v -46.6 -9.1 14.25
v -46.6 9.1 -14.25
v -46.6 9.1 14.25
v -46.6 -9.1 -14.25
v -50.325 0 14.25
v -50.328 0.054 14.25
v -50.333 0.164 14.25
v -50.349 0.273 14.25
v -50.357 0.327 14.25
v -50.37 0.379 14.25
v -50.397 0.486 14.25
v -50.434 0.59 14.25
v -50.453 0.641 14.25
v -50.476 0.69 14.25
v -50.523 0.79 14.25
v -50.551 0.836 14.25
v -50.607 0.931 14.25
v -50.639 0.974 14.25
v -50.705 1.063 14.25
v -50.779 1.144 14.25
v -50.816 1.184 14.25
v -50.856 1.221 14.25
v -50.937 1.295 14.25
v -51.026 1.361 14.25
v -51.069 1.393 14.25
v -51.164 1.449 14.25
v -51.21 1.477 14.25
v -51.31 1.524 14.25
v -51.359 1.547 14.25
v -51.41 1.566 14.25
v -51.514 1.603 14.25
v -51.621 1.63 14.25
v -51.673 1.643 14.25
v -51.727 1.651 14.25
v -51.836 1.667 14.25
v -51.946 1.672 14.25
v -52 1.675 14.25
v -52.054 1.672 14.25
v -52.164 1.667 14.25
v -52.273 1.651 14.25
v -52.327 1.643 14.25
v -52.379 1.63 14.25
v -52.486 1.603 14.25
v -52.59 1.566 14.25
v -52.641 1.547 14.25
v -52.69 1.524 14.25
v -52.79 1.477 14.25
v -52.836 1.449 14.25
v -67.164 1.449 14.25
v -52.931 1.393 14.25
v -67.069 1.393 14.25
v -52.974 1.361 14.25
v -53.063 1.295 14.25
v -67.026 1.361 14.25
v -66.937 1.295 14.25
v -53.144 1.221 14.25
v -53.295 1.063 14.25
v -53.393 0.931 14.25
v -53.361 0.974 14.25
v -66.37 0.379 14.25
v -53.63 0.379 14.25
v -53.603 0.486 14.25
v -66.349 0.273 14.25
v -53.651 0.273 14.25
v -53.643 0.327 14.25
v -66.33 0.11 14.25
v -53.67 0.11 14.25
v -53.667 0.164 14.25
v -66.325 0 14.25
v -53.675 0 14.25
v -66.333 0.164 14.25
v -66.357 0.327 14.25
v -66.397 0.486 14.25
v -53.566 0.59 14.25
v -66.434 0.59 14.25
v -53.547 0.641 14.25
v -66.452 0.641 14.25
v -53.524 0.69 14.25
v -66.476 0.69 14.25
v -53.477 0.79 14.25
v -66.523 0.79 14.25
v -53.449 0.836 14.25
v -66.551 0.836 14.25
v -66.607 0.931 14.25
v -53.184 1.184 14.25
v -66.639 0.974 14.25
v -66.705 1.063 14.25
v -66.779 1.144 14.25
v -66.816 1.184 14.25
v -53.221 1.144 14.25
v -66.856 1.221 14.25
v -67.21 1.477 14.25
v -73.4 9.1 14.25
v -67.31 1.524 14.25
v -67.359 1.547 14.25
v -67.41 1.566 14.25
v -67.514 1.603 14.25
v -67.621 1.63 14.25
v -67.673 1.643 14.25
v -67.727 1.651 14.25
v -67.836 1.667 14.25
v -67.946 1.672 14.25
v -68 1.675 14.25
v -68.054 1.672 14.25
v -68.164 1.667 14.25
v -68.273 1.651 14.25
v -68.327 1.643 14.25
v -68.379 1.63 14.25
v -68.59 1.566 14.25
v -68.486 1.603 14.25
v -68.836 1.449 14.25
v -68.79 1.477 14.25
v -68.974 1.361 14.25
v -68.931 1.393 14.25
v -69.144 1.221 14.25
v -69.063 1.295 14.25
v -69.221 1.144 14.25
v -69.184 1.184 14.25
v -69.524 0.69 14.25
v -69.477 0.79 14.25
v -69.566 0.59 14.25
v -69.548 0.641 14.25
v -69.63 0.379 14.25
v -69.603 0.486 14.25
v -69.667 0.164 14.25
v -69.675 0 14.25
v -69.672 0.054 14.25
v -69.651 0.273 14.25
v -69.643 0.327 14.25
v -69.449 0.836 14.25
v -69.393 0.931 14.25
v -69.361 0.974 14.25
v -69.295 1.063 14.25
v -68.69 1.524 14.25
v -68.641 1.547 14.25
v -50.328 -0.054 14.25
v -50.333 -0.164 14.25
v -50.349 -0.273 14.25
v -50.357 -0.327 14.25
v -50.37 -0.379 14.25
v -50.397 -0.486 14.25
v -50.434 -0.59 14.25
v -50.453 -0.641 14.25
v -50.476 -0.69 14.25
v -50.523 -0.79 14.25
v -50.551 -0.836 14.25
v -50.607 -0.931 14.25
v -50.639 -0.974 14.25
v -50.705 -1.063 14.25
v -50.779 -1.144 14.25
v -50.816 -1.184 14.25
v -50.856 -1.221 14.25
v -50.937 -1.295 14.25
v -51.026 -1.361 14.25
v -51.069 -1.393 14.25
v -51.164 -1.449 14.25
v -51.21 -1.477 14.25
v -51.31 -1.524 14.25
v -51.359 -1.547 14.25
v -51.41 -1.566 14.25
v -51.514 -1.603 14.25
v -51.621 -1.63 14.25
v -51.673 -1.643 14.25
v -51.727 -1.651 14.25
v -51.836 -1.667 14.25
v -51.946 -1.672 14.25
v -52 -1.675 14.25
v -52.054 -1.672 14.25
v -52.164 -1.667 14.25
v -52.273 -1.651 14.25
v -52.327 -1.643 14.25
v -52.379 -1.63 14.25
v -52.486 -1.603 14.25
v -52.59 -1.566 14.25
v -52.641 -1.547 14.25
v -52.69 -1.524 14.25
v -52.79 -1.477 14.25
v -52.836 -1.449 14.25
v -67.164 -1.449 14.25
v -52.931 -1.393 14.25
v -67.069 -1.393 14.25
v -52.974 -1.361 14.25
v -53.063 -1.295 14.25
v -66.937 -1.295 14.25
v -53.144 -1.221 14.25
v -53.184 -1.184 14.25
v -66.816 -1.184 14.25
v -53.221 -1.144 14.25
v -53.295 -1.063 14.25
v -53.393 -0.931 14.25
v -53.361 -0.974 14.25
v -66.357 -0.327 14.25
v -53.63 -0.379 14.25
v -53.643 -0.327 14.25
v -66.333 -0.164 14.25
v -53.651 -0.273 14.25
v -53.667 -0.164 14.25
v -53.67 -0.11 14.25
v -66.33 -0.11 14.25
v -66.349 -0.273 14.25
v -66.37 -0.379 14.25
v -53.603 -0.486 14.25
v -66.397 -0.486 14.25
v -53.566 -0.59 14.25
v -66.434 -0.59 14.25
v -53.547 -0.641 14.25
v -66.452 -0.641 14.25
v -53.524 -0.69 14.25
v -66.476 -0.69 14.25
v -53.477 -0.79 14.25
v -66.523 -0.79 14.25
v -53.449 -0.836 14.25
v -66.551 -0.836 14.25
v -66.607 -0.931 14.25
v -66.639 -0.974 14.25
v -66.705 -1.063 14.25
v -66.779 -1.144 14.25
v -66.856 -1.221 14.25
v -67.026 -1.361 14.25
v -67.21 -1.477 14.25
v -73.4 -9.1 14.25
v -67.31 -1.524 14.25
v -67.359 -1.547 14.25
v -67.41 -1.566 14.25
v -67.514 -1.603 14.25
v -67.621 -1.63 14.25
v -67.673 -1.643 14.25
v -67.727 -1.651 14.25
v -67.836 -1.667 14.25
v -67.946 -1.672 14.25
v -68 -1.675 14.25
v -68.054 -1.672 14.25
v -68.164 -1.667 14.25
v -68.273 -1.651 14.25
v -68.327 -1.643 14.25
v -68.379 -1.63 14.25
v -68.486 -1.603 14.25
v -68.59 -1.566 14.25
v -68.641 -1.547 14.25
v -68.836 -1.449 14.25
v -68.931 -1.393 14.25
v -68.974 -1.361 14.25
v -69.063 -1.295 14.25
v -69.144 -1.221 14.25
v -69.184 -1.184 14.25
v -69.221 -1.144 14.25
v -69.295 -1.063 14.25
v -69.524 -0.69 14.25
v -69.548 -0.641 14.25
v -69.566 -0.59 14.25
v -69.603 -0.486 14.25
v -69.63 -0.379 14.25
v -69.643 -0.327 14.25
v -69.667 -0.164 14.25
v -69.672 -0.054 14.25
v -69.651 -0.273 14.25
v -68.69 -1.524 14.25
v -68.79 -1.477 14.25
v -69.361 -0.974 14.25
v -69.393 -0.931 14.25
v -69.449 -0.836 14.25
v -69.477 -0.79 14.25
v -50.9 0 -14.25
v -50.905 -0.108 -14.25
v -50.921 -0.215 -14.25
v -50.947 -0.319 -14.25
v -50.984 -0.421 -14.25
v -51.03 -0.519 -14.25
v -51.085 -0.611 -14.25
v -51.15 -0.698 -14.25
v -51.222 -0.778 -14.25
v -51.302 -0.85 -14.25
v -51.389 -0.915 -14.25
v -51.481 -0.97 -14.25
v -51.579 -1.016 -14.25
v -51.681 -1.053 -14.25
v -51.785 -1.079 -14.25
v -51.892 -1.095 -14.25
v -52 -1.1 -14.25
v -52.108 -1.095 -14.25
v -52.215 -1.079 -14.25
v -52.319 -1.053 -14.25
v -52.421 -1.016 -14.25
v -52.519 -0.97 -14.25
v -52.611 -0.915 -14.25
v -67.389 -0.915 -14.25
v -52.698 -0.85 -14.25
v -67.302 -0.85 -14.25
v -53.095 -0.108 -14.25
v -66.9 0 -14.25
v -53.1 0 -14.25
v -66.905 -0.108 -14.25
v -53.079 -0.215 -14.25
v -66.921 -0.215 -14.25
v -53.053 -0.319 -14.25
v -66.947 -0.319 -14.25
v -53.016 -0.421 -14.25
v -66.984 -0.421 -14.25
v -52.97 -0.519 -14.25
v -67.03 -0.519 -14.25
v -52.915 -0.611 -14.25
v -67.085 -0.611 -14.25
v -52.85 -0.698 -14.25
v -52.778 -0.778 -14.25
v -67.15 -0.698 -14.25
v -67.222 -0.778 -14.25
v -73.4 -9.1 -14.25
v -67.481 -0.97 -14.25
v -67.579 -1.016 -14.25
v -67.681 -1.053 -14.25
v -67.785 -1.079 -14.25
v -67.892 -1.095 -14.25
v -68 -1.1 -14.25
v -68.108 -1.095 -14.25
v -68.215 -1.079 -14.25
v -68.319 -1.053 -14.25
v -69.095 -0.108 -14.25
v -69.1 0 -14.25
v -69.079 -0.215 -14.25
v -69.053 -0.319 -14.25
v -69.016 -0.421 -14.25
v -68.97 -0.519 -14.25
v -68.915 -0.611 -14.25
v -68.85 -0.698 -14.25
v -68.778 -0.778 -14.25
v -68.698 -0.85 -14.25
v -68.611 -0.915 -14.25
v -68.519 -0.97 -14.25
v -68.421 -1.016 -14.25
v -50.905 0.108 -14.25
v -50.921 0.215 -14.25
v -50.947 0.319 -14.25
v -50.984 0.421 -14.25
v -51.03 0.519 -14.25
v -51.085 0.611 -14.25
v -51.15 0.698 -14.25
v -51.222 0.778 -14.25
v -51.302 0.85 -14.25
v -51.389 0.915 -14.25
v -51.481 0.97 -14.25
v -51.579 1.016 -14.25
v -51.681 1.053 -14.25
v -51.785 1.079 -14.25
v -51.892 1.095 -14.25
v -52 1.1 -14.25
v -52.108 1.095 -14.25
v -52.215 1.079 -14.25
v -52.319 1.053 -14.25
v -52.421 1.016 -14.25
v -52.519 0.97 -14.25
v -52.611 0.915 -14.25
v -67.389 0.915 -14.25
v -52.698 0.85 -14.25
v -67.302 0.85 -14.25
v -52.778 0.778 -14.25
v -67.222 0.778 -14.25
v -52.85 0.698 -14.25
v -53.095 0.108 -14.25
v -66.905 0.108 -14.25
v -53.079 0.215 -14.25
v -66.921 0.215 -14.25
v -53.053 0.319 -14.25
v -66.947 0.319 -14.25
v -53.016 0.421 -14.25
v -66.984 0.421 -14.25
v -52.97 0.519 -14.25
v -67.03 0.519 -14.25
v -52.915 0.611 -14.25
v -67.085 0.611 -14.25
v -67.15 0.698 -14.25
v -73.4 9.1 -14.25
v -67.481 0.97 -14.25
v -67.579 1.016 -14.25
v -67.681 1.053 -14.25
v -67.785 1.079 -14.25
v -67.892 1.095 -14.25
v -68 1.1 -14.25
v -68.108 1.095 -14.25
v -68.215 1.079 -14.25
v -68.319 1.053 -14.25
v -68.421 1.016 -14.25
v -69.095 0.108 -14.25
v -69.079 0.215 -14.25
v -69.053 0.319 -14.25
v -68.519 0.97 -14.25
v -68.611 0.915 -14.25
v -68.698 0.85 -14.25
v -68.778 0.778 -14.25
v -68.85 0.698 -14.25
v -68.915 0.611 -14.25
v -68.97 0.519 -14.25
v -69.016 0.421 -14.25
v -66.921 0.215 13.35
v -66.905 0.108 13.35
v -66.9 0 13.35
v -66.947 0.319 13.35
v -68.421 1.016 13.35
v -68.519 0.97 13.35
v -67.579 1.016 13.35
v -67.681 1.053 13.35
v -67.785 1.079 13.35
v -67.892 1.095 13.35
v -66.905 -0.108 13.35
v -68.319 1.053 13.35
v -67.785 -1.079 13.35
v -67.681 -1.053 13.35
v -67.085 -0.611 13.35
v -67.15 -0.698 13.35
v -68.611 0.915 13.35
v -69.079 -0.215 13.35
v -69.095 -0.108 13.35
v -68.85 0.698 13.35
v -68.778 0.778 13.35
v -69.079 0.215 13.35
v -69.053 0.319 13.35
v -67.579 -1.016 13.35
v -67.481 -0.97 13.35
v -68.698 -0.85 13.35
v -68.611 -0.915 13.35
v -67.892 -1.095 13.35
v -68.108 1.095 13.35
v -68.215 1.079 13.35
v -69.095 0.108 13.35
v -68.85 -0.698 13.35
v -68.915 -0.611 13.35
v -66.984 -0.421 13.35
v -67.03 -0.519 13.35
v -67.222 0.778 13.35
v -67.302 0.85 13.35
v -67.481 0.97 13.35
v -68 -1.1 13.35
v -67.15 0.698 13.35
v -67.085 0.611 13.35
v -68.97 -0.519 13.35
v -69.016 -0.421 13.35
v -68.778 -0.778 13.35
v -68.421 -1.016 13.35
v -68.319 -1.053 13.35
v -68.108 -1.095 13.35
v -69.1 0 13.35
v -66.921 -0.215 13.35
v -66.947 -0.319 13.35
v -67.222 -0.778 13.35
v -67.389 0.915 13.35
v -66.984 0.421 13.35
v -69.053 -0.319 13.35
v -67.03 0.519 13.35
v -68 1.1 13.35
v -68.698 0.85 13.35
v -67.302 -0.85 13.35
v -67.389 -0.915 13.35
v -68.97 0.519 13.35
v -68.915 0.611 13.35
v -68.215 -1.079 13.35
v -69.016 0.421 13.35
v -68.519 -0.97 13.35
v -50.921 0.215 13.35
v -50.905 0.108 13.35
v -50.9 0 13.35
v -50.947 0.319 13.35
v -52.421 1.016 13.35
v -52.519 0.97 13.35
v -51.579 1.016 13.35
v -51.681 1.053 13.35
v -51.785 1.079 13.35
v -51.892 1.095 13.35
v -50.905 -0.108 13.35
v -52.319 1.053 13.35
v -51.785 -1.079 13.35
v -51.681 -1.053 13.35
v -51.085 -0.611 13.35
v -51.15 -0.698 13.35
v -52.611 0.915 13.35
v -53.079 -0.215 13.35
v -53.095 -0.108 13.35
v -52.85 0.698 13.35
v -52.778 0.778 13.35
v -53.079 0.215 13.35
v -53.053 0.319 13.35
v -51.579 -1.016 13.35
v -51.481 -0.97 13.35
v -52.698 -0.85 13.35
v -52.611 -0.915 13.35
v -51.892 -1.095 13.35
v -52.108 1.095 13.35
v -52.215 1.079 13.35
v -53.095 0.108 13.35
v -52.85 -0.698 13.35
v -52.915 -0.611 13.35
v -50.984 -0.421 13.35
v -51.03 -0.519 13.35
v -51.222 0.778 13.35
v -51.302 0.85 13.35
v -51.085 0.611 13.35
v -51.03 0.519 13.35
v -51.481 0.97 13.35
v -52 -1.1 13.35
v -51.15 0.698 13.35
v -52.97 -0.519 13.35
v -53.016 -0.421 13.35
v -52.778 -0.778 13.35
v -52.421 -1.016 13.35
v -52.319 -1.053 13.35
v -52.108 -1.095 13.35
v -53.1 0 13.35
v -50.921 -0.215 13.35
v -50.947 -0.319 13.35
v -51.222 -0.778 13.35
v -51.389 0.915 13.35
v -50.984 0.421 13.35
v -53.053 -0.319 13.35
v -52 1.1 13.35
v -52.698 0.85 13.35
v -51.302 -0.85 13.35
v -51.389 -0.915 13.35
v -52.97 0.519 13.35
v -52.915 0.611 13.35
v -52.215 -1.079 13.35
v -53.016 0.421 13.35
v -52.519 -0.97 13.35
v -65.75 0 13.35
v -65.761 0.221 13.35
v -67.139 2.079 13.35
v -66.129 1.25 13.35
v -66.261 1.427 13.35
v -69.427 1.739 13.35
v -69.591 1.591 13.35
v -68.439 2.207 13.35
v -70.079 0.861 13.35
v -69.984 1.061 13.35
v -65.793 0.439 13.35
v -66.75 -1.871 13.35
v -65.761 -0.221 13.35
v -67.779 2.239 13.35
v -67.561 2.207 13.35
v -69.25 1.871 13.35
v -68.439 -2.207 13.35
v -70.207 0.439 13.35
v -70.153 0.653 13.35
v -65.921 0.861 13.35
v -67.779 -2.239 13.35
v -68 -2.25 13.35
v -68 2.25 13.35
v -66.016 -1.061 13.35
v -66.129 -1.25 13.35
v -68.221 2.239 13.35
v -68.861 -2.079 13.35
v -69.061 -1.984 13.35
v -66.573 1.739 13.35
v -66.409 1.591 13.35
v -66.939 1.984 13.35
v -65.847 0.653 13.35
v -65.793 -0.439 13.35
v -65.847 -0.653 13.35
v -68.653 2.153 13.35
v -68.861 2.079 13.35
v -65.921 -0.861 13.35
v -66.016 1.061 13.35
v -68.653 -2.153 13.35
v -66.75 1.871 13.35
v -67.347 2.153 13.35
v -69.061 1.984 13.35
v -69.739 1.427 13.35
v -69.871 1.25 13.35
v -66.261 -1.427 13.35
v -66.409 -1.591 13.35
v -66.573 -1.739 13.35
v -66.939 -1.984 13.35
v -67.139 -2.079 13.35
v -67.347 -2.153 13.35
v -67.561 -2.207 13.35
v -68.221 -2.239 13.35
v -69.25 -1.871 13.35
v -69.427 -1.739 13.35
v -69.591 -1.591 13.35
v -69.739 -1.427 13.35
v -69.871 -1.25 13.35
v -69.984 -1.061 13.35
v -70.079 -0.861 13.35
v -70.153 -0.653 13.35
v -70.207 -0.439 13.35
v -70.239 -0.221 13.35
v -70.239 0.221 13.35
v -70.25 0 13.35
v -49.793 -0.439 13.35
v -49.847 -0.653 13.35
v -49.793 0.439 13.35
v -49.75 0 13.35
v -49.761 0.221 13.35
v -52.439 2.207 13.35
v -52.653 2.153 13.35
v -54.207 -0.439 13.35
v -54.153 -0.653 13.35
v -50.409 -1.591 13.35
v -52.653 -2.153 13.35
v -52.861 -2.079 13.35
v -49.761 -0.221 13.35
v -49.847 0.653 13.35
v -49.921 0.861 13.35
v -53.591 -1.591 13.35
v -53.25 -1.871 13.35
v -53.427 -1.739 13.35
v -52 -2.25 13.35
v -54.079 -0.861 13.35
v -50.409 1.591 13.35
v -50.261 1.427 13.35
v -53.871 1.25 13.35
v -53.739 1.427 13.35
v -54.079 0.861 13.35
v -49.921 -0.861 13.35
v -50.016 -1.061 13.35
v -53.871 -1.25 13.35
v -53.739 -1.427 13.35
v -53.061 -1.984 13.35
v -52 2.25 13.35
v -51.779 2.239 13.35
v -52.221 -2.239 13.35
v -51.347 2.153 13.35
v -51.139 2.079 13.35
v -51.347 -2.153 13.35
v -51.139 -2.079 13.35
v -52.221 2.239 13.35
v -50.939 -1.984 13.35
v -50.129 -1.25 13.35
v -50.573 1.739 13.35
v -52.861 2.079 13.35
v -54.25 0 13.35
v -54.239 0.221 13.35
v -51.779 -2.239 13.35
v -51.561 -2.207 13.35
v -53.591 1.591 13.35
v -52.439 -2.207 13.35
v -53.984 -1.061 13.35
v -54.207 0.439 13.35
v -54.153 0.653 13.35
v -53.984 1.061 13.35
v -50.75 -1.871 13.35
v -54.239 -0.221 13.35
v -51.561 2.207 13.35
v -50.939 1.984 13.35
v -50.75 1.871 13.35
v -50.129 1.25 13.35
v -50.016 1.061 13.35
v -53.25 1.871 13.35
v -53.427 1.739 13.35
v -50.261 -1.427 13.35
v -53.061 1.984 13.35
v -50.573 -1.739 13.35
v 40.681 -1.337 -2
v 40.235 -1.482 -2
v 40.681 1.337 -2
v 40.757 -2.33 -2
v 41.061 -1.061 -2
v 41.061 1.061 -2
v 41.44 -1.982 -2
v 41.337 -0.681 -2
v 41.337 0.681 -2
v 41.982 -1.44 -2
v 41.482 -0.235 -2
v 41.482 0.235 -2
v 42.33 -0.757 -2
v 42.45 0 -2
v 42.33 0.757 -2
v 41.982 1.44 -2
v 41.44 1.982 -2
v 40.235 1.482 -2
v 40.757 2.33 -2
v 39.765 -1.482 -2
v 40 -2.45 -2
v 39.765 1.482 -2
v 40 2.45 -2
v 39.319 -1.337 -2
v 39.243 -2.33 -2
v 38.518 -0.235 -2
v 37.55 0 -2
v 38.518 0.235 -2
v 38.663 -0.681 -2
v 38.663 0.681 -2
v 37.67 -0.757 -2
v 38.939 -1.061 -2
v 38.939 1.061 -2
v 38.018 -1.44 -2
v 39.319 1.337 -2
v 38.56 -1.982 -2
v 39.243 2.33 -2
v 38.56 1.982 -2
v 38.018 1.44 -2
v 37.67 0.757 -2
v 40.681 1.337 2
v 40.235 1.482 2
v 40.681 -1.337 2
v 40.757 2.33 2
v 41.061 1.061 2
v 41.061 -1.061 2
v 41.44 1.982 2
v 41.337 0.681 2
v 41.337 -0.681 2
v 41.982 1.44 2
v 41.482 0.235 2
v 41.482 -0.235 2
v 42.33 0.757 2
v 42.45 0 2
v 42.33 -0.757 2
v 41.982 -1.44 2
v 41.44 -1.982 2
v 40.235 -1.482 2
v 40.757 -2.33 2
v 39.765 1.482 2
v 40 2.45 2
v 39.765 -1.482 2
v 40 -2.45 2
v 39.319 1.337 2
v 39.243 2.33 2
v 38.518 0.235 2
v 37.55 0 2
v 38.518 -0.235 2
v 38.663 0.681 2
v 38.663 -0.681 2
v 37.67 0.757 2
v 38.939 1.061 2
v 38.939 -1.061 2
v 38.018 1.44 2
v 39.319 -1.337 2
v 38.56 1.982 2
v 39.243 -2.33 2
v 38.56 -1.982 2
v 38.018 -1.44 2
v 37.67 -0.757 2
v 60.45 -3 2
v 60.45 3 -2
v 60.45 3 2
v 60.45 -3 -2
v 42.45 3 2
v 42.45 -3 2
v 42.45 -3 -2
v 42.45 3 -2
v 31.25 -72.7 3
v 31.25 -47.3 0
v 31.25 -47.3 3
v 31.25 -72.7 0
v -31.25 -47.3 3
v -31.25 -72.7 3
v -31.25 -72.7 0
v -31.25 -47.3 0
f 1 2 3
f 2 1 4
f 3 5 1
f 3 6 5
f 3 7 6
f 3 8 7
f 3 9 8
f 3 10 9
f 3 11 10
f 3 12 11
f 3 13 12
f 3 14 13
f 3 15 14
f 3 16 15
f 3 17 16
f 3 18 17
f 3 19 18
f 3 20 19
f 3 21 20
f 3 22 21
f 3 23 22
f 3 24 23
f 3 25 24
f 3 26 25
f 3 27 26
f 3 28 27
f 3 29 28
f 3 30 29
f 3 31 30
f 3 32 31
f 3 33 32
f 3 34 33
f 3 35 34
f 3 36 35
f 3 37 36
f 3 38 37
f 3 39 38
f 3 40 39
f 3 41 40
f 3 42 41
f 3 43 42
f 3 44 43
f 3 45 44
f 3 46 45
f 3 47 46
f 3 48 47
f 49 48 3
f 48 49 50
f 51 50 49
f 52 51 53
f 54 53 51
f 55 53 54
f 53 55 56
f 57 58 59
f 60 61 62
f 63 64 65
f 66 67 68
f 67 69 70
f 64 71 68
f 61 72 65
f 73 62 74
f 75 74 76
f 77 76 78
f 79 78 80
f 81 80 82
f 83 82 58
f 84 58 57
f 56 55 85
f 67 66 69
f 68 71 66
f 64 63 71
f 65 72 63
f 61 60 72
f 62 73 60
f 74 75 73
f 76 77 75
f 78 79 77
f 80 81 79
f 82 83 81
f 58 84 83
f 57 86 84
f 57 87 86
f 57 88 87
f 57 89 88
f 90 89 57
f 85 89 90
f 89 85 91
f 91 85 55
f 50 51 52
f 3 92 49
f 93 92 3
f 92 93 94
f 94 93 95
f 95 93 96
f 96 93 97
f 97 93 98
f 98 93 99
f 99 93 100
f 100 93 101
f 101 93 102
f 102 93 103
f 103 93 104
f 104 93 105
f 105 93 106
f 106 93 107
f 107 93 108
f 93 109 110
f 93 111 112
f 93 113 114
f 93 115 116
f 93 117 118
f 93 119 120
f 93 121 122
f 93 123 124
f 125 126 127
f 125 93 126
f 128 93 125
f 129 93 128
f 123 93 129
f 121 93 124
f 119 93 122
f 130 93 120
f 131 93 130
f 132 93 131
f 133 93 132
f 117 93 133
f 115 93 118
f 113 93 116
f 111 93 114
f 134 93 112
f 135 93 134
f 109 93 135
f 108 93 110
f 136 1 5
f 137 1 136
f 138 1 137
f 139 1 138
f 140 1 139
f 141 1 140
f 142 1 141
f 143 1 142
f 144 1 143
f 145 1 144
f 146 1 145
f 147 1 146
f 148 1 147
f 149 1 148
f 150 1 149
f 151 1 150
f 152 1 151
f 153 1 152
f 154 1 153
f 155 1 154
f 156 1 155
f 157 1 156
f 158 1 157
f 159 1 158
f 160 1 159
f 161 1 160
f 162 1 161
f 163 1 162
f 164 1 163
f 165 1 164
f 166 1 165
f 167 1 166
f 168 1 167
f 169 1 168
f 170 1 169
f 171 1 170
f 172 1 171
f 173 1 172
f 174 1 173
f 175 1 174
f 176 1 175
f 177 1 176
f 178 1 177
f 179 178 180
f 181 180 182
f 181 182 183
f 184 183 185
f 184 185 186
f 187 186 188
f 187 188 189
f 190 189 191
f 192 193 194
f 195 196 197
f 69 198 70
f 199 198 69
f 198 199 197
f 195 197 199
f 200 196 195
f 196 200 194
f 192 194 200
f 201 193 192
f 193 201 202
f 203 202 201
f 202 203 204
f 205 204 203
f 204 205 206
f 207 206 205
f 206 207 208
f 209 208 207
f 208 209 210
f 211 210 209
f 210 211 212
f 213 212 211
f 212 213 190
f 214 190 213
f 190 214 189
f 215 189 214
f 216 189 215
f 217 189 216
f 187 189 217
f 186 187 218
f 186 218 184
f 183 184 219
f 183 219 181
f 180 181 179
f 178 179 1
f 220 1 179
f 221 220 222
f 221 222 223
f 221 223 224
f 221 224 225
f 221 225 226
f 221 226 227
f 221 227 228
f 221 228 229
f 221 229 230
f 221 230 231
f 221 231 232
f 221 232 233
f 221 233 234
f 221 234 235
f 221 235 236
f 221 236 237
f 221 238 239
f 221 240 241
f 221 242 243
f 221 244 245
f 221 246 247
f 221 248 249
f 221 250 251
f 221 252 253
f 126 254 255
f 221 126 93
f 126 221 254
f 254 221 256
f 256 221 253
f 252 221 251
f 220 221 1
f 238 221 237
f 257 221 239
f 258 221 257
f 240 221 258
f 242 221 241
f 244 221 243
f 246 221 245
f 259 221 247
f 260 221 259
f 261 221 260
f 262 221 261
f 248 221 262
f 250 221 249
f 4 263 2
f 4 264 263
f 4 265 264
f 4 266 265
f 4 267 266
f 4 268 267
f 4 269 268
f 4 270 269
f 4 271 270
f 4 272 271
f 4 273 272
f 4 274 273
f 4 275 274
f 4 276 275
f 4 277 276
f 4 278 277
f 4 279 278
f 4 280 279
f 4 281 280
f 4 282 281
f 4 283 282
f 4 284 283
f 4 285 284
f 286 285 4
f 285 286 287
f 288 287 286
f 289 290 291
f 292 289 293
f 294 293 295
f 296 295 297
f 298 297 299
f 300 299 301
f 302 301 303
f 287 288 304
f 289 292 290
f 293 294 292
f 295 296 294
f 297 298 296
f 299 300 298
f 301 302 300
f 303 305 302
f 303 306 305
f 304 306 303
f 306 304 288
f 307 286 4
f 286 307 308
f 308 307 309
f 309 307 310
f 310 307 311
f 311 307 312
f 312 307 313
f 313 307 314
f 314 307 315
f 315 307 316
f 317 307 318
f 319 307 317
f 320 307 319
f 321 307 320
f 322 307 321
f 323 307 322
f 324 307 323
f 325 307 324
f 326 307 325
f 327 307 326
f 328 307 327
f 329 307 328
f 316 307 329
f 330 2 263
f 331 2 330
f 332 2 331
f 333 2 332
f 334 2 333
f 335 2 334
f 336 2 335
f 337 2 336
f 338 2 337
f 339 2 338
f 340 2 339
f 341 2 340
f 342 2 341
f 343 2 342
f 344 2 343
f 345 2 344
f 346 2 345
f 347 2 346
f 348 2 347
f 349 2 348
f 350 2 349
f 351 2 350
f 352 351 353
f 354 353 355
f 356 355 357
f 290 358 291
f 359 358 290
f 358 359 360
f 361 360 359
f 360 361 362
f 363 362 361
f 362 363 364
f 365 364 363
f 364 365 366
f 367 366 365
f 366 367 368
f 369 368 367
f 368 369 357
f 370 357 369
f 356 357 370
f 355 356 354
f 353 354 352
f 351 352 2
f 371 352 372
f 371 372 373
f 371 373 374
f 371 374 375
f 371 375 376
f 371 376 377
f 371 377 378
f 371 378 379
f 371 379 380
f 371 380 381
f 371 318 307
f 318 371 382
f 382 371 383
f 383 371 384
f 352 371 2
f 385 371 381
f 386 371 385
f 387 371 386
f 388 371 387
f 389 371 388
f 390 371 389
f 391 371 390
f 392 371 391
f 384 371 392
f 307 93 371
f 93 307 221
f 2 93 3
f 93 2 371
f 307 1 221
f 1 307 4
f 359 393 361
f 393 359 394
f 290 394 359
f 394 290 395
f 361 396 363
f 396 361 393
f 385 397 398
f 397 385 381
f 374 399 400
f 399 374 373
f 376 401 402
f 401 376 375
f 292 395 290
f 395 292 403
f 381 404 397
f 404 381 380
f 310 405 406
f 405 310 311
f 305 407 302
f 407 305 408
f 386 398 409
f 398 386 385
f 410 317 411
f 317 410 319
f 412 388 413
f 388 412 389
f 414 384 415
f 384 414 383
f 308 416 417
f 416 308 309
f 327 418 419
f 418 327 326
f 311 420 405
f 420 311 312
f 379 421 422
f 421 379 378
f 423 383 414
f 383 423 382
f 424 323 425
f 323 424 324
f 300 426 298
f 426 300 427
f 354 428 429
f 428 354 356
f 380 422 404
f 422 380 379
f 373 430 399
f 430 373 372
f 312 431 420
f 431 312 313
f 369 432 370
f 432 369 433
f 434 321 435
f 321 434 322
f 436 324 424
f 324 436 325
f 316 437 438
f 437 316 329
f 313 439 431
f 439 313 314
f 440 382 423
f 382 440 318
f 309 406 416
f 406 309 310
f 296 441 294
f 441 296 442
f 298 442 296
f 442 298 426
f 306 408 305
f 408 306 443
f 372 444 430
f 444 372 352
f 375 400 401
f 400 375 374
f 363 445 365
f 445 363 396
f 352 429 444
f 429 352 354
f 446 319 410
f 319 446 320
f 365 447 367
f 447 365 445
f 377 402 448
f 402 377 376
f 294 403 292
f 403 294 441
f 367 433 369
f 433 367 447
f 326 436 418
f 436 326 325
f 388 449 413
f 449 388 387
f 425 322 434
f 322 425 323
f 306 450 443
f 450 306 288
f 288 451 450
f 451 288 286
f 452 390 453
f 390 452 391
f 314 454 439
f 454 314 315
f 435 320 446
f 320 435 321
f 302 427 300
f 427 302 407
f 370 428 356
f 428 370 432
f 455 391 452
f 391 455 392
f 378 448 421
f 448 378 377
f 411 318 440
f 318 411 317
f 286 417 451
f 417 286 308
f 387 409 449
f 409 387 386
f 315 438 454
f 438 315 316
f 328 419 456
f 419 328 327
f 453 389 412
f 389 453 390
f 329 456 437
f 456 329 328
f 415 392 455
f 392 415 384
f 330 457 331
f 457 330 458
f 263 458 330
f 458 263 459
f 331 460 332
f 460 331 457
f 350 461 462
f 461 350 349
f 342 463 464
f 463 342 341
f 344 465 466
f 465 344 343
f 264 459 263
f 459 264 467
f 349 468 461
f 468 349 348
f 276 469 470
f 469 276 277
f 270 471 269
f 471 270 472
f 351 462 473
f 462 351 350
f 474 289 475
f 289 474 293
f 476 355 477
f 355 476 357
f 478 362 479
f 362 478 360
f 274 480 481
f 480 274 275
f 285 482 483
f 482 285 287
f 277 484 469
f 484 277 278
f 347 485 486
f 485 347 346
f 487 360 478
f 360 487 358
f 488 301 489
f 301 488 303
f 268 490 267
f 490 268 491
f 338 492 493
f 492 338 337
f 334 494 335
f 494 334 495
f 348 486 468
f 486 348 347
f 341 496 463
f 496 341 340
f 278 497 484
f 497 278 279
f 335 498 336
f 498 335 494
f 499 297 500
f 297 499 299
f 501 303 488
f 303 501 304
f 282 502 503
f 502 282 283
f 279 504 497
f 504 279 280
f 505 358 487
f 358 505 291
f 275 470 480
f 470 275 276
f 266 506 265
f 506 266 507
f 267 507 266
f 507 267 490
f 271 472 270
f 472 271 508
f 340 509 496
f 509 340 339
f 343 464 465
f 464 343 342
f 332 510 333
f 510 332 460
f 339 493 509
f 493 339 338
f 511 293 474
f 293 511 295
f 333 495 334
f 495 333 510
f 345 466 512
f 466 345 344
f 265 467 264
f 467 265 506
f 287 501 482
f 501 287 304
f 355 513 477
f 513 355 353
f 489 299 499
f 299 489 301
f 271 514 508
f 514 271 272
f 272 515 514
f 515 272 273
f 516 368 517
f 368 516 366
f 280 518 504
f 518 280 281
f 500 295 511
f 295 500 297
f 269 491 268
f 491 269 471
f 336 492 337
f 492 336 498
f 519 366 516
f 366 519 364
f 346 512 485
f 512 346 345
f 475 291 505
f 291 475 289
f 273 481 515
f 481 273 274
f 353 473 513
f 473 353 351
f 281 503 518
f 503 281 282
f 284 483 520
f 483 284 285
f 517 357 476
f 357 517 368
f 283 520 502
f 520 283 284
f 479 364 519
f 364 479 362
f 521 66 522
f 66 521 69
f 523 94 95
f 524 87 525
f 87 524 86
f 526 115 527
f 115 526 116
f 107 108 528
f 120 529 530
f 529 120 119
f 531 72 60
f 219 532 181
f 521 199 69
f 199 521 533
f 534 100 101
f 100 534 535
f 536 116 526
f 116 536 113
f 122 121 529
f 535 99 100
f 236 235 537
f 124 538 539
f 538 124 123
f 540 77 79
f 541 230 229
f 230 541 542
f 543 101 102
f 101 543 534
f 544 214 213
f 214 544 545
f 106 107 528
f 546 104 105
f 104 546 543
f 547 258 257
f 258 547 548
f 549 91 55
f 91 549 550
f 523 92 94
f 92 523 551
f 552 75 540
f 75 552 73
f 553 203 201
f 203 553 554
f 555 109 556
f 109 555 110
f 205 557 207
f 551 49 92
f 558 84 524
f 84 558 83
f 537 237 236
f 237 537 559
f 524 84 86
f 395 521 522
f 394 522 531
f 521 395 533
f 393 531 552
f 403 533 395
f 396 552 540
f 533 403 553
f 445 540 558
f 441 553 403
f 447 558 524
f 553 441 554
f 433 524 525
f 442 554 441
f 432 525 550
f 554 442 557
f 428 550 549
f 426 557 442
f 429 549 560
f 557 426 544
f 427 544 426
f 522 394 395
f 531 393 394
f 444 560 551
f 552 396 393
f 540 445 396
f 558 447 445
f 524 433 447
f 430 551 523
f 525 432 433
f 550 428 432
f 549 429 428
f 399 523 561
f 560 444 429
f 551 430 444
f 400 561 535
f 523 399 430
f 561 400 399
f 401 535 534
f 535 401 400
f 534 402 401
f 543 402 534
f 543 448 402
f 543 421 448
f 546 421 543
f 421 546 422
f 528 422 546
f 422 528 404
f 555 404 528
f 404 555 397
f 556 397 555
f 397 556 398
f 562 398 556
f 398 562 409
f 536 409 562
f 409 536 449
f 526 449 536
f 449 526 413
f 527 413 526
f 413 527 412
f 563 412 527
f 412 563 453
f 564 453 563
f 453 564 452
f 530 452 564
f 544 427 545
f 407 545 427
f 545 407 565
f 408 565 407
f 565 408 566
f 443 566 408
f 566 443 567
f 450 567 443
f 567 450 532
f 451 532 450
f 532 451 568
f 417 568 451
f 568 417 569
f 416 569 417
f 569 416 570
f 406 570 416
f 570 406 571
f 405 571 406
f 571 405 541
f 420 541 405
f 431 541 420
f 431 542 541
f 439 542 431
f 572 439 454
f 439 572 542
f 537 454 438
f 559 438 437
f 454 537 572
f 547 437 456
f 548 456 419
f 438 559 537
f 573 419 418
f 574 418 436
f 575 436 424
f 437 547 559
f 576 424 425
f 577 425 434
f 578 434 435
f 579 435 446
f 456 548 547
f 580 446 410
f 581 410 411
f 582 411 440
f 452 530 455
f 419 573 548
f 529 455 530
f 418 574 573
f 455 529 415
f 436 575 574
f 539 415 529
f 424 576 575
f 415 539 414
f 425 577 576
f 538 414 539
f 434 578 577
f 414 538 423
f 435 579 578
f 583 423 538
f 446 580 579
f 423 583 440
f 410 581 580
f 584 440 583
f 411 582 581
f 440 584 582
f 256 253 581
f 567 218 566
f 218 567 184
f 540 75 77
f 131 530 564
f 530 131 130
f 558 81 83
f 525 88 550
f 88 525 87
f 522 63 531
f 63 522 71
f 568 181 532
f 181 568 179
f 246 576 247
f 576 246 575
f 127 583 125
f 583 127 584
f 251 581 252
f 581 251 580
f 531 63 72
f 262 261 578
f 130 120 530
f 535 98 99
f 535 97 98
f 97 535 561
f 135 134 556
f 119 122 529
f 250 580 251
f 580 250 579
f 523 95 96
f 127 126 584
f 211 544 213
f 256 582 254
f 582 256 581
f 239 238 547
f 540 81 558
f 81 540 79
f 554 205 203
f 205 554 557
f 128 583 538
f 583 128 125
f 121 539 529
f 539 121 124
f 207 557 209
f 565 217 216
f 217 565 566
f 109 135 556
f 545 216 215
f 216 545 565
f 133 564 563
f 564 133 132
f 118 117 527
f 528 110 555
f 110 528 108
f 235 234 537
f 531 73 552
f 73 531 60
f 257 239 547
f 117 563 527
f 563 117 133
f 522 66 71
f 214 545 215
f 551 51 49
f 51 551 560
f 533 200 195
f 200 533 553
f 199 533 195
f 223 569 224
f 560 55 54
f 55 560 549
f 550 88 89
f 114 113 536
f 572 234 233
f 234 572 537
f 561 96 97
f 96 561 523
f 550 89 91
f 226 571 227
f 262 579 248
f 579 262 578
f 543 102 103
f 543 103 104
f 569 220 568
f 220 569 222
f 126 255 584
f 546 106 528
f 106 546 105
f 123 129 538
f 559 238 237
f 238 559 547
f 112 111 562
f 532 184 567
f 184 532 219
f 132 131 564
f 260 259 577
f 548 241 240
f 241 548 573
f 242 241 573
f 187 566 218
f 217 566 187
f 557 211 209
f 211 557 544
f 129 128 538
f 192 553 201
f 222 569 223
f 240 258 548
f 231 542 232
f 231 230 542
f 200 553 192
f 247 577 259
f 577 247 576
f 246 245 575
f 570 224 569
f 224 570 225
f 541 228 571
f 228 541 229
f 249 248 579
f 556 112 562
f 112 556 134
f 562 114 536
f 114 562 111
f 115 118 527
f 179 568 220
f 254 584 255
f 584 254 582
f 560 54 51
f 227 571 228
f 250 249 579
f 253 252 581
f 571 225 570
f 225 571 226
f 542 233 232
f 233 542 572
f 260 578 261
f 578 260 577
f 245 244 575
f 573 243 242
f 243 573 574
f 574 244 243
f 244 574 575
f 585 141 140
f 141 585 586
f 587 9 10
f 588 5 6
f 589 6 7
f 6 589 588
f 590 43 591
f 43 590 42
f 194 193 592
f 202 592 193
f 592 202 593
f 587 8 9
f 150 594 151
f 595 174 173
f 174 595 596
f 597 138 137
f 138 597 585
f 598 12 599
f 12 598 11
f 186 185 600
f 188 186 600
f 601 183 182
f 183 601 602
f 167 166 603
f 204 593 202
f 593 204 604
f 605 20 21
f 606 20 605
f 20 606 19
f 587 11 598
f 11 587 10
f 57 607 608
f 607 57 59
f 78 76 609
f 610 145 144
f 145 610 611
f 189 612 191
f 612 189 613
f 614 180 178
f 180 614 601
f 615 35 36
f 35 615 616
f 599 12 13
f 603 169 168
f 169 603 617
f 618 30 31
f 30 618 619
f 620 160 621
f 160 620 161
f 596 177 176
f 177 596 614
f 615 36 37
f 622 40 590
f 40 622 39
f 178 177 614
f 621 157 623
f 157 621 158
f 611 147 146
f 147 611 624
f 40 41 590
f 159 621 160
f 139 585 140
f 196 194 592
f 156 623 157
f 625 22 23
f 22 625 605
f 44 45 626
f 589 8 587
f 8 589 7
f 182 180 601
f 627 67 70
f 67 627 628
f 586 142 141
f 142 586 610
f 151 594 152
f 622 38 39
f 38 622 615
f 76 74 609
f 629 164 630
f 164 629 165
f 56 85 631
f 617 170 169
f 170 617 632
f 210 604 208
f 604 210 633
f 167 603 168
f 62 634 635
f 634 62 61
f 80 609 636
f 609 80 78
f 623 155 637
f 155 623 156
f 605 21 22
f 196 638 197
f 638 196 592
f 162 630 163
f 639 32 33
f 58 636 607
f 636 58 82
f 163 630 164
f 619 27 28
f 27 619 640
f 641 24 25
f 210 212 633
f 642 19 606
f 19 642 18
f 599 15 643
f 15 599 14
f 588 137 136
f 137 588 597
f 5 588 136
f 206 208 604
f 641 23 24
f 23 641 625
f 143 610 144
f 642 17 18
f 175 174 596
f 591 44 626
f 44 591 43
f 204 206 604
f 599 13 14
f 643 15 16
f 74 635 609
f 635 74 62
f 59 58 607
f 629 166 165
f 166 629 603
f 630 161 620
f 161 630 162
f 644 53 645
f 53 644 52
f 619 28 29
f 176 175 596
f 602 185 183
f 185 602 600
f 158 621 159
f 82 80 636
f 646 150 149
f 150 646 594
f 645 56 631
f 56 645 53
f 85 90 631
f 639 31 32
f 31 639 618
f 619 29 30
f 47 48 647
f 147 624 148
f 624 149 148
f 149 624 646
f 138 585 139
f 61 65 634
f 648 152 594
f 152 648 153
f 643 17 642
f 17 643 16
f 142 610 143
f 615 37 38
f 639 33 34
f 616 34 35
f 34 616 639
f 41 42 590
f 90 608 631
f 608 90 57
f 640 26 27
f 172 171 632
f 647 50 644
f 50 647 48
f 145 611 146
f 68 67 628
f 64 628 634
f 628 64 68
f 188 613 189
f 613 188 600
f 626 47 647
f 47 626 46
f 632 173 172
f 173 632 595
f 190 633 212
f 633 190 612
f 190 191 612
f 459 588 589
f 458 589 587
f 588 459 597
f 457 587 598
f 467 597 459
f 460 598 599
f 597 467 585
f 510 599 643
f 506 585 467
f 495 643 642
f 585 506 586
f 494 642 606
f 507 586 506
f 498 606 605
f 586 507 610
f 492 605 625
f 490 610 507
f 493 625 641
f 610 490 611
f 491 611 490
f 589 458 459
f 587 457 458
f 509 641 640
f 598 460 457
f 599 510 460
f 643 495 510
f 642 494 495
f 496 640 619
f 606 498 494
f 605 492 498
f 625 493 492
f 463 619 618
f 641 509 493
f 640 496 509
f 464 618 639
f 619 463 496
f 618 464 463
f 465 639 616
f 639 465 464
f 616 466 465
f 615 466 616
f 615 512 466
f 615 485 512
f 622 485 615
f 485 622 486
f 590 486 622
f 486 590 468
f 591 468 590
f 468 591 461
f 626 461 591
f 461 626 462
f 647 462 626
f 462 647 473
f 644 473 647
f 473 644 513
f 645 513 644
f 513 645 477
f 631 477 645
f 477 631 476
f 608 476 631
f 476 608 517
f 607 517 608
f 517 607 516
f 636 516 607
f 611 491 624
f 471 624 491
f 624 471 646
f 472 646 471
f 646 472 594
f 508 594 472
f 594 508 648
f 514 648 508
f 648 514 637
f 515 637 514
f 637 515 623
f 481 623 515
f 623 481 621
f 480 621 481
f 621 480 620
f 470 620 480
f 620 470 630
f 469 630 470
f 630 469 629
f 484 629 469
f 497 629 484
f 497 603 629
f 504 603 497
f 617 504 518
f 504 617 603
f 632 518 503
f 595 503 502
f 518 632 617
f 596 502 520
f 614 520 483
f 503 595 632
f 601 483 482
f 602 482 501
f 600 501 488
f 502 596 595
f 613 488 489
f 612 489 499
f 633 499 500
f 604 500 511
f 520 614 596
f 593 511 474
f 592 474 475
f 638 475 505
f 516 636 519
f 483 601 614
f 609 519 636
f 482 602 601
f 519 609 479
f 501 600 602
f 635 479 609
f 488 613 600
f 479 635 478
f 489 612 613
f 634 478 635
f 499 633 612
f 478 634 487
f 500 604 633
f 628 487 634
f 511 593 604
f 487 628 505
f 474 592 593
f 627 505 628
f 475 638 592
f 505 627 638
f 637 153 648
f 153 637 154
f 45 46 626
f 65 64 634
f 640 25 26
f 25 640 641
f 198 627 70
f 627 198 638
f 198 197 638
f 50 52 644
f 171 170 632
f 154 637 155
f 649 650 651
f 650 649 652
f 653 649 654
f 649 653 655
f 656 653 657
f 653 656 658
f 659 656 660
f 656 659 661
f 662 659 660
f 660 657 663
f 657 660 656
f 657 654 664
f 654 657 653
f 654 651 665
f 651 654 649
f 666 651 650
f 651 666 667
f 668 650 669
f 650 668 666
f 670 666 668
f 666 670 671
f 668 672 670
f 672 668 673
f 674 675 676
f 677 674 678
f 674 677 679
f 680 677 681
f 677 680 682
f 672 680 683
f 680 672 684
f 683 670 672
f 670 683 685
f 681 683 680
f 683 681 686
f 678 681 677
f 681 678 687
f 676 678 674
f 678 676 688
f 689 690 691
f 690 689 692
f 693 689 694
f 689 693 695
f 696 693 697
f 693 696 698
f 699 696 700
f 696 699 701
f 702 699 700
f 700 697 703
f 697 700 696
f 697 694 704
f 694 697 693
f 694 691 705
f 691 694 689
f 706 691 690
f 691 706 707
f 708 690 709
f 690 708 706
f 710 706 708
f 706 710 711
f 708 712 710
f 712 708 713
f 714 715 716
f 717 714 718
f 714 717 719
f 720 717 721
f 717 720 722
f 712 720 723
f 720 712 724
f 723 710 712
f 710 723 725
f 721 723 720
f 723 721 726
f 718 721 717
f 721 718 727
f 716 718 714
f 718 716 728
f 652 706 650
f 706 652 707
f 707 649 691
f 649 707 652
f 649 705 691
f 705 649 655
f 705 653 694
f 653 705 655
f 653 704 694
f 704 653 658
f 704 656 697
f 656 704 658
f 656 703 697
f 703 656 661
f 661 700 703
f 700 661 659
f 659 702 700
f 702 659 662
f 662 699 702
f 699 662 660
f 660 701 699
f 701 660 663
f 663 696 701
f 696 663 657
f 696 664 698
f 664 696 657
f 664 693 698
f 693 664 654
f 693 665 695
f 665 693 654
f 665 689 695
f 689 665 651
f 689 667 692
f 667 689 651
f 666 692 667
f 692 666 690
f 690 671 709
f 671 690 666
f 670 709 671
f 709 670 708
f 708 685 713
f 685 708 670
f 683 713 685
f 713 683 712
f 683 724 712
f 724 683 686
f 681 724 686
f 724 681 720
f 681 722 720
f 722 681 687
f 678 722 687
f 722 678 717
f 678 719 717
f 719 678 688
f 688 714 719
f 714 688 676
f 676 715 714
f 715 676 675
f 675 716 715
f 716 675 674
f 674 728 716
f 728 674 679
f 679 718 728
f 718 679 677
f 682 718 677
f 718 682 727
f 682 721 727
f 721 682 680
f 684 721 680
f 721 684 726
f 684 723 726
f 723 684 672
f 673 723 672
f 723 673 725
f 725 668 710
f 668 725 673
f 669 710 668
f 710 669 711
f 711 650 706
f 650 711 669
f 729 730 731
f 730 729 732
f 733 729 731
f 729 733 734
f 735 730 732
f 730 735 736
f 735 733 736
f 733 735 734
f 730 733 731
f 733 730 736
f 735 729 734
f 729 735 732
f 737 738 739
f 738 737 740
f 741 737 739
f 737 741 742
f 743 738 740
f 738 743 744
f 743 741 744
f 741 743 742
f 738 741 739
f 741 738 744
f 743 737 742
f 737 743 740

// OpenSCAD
// lizard_parts.scad
// OpenSCAD recreation of generated lizard parts (units: mm).
// Matches dimensions used previously in the Python STLs.

// -------------------------- PARAMETERS --------------------------
MG90S_length = 22.8;
MG90S_width  = 12.2;
MG90S_height = 28.5;

servo_clearance = [MG90S_length + 4, MG90S_width + 6, MG90S_height]; // body box with clearance

// Servo mounting screw info
mount_spacing = 16.0;   // center-to-center along length (mm)
mount_clearance_d = 2.2; // cylinder clearance for M2 screw (mm)
countersink_outer_d = 4.5; // outer diameter of countersink
countersink_depth = 1.8;   // depth of countersink

// Servo horn / hub
horn_teeth = 20;         // tooth count (20T as requested)
hub_outer_d = 4.9;       // nominal hub outer diameter (mm)
hub_inner_d = 3.0;       // valley diameter approx
hub_thickness = 4.0;     // hub thickness (mm)
horn_arm_len = 18.0;     // arm length (mm)
horn_arm_w = 6.0;        // arm width (mm)
horn_arm_th = hub_thickness; // thickness to match hub

// PCA9685 board approx dims
pca_length = 62.5;
pca_width  = 25.4;
pca_thick  = 3.0;

// Electronics enclosure
elec_x = 60; elec_y = 40; elec_z = 20;

// Body & tail segments (toy scale)
body_total_length = 120.0; // mm
body_segments = 5;
body_seg_len = body_total_length / body_segments;
body_seg_w = 40;
body_seg_h = 20;

tail_total_length = 90.0;
tail_segments = 3;
tail_seg_len = tail_total_length / tail_segments;
tail_seg_w0 = 20;
tail_seg_h0 = 12;

// Head & jaw
head_x = 40; head_y = 30; head_z = 18;
jaw_x = 38; jaw_y = 20; jaw_z = 12;

// Leg blocks
hip_box = [30, 12, 10];
knee_box = [28, 10, 8];

// Spine connectors
spine_box = [10, 12, 14];

// -------------------------- HELPERS --------------------------
module box(s = [10,10,10]) {
    translate([-s[0]/2, -s[1]/2, -s[2]/2]) cube(s, center=false);
}

module cylinder_centered(d = 2, h = 4, $fn=64) {
    translate([0,0,-h/2]) cylinder(d=d, h=h, center=false, $fn=$fn);
}

// create an n-point star polygon for spline approximation
function spline_points(teeth, outer_r, inner_r) =
    [ for(i=[0:teeth*2-1]) let (ang = i*360/(teeth*2))
        ( ( (i % 2 == 0) ? outer_r : inner_r ) * [cos(ang), sin(ang)] )
    ];

// -------------------------- SERVO BODY + HOLES --------------------------
module servo_body() {
    // basic servo body (box centered at origin)
    box(servo_clearance);
}

module servo_mount_holes() {
    // two through-hole cylinders centered on Y=0, spaced along X
    translate([-mount_spacing/2, 0, 0]) rotate([0,0,0]) cylinder(d=mount_clearance_d, h=MG90S_height+8, $fn=64, center=true);
    translate([ mount_spacing/2, 0, 0]) cylinder(d=mount_clearance_d, h=MG90S_height+8, $fn=64, center=true);
}

module countersink(offsetX) {
    // a shallow cone-like countersink (approx with difference of two cones)
    // simple approximation: union of a shallow cone and short cylinder
    translate([offsetX,0,0]) difference() {
        // outer shallow cone: use linear_extrude on 2D circle approximation
        translate([0,0,0]) rotate_extrude($fn=64) translate([countersink_outer_d/2, 0, 0]) square([0.001, countersink_depth], center=false);
        // remove inner cylindrical hole
        translate([0,0,-1]) cylinder(d=mount_clearance_d, h=countersink_depth+2, $fn=64, center=false);
    }
}

module servo_with_holes() {
    // servo body with countersunk mounting holes (holes subtracted)
    difference() {
        servo_body();
        // subtract through-hole cylinders (extend beyond box)
        translate([ -mount_spacing/2, 0, 0 ]) rotate([0,0,0]) cylinder(d=mount_clearance_d, h=servo_clearance[2]+10, center=true, $fn=64);
        translate([  mount_spacing/2, 0, 0 ]) rotate([0,0,0]) cylinder(d=mount_clearance_d, h=servo_clearance[2]+10, center=true, $fn=64);
        // subtract countersink cones (approximated with scaled cones)
        translate([-mount_spacing/2,0,servo_clearance[2]/2 - countersink_depth/2]) rotate([0,0,0]) 
            cylinder(d1=countersink_outer_d, d2=mount_clearance_d, h=countersink_depth, $fn=64);
        translate([ mount_spacing/2,0,servo_clearance[2]/2 - countersink_depth/2]) rotate([0,0,0]) 
            cylinder(d1=countersink_outer_d, d2=mount_clearance_d, h=countersink_depth, $fn=64);
    }
}

// -------------------------- SERVO HORN (20T approximate spline) --------------------------
module servo_horn_20T(teeth = horn_teeth, outer_d = hub_outer_d, inner_d = hub_inner_d, thickness = hub_thickness, arm_len = horn_arm_len, arm_w = horn_arm_w) {
    // Build spline hub by extruding a 2D star polygon
    outer_r = outer_d/2;
    inner_r = inner_d/2;
    pts = spline_points(teeth, outer_r, inner_r);
    // make 2D polygon with center at 0,0
    translate([0,0,0]) linear_extrude(height=thickness, center=true, convexity=10)
        polygon(points = pts);
    // add rectangular arm attached to hub
    translate([ (outer_r + arm_len/2), 0, 0 ]) cube([arm_len, arm_w, thickness], center=true);
}

// -------------------------- OTHER PARTS --------------------------
module pca9685_board() {
    translate([0,0,pca_thick/2]) cube([pca_length, pca_width, pca_thick], center=true);
}

module electronics_enclosure() {
    translate([0,0,elec_z/2]) cube([elec_x, elec_y, elec_z], center=true);
}

module body_segment(i=0) {
    // i is index (0..body_segments-1)
    translate([0,0,0]) box([body_seg_len, body_seg_w, body_seg_h]);
}

module tail_segment(i=0) {
    // taper width/height with segment index
    w = tail_seg_w0 - i*3;
    h = tail_seg_h0 - i*2;
    translate([0,0,0]) box([tail_seg_len, w, h]);
}

module head_piece() { box([head_x, head_y, head_z]); }
module jaw_piece()  { box([jaw_x, jaw_y, jaw_z]); }

module hip_piece(side="L") {
    box(hip_box);
}

module knee_piece(side="L") {
    box(knee_box);
}

module spine_connector(i=0) {
    box(spine_box);
}

// -------------------------- ASSEMBLY EXAMPLES --------------------------
// Uncomment/modify any of these to render a single part for export.
// Use F6 (Render) and then Export as STL to get an STL per part.

// Render servo body (box only)
module servo_body_only_for_export() {
    servo_body();
}

// Render servo body WITH holes (ready-to-print with countersinks)
module servo_body_with_holes_for_export() {
    servo_with_holes();
}

// Render separate hole solids (useful if you want to boolean in another tool)
module servo_holes_for_export() {
    translate([-mount_spacing/2,0,0]) cylinder(d=mount_clearance_d, h=servo_clearance[2]+10, center=true, $fn=64);
    translate([ mount_spacing/2,0,0]) cylinder(d=mount_clearance_d, h=servo_clearance[2]+10, center=true, $fn=64);
    translate([-mount_spacing/2,0,servo_clearance[2]/2 - countersink_depth/2]) cylinder(d1=countersink_outer_d, d2=mount_clearance_d, h=countersink_depth, $fn=64);
    translate([ mount_spacing/2,0,servo_clearance[2]/2 - countersink_depth/2]) cylinder(d1=countersink_outer_d, d2=mount_clearance_d, h=countersink_depth, $fn=64);
}

// Render servo horn
module servo_horn_for_export() {
    servo_horn_20T();
}

// Example: Layout a few parts on the build plate for visual checks
module layout_example() {
    // servo with holes on the left
    translate([-60,0,0]) servo_body_with_holes_for_export();
    // horn to the right
    translate([40,0,0]) servo_horn_for_export();
    // PCA board behind
    translate([0,-60,0]) pca9685_board();
}

// -------------------------- USER CHOICE: what to render --------------------------
// Change this string to the module name you want to render and export as STL.
// Options: "servo_body_only", "servo_body_with_holes", "servo_holes", "servo_horn", "pca", "elec", "body_segments", "tail_segments", "head", "jaw", "legs", "spine", "layout"
generate_separate_part = "layout";

if (generate_separate_part == "servo_body_only") {
    servo_body_only_for_export();
} else if (generate_separate_part == "servo_body_with_holes") {
    servo_body_with_holes_for_export();
} else if (generate_separate_part == "servo_holes") {
    servo_holes_for_export();
} else if (generate_separate_part == "servo_horn") {
    servo_horn_for_export();
} else if (generate_separate_part == "pca") {
    pca9685_board();
} else if (generate_separate_part == "elec") {
    electronics_enclosure();
} else if (generate_separate_part == "body_segments") {
    translate([- (body_total_length/2) + body_seg_len/2, 0, 0])
    for(i=[0:body_segments-1]) {
        translate([i*body_seg_len,0,0]) body_segment(i);
    }
} else if (generate_separate_part == "tail_segments") {
    translate([- (tail_total_length/2) + tail_seg_len/2, 0, 0])
    for(i=[0:tail_segments-1]) {
        translate([i*tail_seg_len,0,0]) tail_segment(i);
    }
} else if (generate_separate_part == "head") {
    head_piece();
} else if (generate_separate_part == "jaw") {
    jaw_piece();
} else if (generate_separate_part == "legs") {
    translate([-30,0,0]) hip_piece();
    translate([30,0,0]) knee_piece();
} else if (generate_separate_part == "spine") {
    for(i=[0:3]) translate([i*15,0,0]) spine_connector(i);
} else {
    // default layout
    layout_example();
}
